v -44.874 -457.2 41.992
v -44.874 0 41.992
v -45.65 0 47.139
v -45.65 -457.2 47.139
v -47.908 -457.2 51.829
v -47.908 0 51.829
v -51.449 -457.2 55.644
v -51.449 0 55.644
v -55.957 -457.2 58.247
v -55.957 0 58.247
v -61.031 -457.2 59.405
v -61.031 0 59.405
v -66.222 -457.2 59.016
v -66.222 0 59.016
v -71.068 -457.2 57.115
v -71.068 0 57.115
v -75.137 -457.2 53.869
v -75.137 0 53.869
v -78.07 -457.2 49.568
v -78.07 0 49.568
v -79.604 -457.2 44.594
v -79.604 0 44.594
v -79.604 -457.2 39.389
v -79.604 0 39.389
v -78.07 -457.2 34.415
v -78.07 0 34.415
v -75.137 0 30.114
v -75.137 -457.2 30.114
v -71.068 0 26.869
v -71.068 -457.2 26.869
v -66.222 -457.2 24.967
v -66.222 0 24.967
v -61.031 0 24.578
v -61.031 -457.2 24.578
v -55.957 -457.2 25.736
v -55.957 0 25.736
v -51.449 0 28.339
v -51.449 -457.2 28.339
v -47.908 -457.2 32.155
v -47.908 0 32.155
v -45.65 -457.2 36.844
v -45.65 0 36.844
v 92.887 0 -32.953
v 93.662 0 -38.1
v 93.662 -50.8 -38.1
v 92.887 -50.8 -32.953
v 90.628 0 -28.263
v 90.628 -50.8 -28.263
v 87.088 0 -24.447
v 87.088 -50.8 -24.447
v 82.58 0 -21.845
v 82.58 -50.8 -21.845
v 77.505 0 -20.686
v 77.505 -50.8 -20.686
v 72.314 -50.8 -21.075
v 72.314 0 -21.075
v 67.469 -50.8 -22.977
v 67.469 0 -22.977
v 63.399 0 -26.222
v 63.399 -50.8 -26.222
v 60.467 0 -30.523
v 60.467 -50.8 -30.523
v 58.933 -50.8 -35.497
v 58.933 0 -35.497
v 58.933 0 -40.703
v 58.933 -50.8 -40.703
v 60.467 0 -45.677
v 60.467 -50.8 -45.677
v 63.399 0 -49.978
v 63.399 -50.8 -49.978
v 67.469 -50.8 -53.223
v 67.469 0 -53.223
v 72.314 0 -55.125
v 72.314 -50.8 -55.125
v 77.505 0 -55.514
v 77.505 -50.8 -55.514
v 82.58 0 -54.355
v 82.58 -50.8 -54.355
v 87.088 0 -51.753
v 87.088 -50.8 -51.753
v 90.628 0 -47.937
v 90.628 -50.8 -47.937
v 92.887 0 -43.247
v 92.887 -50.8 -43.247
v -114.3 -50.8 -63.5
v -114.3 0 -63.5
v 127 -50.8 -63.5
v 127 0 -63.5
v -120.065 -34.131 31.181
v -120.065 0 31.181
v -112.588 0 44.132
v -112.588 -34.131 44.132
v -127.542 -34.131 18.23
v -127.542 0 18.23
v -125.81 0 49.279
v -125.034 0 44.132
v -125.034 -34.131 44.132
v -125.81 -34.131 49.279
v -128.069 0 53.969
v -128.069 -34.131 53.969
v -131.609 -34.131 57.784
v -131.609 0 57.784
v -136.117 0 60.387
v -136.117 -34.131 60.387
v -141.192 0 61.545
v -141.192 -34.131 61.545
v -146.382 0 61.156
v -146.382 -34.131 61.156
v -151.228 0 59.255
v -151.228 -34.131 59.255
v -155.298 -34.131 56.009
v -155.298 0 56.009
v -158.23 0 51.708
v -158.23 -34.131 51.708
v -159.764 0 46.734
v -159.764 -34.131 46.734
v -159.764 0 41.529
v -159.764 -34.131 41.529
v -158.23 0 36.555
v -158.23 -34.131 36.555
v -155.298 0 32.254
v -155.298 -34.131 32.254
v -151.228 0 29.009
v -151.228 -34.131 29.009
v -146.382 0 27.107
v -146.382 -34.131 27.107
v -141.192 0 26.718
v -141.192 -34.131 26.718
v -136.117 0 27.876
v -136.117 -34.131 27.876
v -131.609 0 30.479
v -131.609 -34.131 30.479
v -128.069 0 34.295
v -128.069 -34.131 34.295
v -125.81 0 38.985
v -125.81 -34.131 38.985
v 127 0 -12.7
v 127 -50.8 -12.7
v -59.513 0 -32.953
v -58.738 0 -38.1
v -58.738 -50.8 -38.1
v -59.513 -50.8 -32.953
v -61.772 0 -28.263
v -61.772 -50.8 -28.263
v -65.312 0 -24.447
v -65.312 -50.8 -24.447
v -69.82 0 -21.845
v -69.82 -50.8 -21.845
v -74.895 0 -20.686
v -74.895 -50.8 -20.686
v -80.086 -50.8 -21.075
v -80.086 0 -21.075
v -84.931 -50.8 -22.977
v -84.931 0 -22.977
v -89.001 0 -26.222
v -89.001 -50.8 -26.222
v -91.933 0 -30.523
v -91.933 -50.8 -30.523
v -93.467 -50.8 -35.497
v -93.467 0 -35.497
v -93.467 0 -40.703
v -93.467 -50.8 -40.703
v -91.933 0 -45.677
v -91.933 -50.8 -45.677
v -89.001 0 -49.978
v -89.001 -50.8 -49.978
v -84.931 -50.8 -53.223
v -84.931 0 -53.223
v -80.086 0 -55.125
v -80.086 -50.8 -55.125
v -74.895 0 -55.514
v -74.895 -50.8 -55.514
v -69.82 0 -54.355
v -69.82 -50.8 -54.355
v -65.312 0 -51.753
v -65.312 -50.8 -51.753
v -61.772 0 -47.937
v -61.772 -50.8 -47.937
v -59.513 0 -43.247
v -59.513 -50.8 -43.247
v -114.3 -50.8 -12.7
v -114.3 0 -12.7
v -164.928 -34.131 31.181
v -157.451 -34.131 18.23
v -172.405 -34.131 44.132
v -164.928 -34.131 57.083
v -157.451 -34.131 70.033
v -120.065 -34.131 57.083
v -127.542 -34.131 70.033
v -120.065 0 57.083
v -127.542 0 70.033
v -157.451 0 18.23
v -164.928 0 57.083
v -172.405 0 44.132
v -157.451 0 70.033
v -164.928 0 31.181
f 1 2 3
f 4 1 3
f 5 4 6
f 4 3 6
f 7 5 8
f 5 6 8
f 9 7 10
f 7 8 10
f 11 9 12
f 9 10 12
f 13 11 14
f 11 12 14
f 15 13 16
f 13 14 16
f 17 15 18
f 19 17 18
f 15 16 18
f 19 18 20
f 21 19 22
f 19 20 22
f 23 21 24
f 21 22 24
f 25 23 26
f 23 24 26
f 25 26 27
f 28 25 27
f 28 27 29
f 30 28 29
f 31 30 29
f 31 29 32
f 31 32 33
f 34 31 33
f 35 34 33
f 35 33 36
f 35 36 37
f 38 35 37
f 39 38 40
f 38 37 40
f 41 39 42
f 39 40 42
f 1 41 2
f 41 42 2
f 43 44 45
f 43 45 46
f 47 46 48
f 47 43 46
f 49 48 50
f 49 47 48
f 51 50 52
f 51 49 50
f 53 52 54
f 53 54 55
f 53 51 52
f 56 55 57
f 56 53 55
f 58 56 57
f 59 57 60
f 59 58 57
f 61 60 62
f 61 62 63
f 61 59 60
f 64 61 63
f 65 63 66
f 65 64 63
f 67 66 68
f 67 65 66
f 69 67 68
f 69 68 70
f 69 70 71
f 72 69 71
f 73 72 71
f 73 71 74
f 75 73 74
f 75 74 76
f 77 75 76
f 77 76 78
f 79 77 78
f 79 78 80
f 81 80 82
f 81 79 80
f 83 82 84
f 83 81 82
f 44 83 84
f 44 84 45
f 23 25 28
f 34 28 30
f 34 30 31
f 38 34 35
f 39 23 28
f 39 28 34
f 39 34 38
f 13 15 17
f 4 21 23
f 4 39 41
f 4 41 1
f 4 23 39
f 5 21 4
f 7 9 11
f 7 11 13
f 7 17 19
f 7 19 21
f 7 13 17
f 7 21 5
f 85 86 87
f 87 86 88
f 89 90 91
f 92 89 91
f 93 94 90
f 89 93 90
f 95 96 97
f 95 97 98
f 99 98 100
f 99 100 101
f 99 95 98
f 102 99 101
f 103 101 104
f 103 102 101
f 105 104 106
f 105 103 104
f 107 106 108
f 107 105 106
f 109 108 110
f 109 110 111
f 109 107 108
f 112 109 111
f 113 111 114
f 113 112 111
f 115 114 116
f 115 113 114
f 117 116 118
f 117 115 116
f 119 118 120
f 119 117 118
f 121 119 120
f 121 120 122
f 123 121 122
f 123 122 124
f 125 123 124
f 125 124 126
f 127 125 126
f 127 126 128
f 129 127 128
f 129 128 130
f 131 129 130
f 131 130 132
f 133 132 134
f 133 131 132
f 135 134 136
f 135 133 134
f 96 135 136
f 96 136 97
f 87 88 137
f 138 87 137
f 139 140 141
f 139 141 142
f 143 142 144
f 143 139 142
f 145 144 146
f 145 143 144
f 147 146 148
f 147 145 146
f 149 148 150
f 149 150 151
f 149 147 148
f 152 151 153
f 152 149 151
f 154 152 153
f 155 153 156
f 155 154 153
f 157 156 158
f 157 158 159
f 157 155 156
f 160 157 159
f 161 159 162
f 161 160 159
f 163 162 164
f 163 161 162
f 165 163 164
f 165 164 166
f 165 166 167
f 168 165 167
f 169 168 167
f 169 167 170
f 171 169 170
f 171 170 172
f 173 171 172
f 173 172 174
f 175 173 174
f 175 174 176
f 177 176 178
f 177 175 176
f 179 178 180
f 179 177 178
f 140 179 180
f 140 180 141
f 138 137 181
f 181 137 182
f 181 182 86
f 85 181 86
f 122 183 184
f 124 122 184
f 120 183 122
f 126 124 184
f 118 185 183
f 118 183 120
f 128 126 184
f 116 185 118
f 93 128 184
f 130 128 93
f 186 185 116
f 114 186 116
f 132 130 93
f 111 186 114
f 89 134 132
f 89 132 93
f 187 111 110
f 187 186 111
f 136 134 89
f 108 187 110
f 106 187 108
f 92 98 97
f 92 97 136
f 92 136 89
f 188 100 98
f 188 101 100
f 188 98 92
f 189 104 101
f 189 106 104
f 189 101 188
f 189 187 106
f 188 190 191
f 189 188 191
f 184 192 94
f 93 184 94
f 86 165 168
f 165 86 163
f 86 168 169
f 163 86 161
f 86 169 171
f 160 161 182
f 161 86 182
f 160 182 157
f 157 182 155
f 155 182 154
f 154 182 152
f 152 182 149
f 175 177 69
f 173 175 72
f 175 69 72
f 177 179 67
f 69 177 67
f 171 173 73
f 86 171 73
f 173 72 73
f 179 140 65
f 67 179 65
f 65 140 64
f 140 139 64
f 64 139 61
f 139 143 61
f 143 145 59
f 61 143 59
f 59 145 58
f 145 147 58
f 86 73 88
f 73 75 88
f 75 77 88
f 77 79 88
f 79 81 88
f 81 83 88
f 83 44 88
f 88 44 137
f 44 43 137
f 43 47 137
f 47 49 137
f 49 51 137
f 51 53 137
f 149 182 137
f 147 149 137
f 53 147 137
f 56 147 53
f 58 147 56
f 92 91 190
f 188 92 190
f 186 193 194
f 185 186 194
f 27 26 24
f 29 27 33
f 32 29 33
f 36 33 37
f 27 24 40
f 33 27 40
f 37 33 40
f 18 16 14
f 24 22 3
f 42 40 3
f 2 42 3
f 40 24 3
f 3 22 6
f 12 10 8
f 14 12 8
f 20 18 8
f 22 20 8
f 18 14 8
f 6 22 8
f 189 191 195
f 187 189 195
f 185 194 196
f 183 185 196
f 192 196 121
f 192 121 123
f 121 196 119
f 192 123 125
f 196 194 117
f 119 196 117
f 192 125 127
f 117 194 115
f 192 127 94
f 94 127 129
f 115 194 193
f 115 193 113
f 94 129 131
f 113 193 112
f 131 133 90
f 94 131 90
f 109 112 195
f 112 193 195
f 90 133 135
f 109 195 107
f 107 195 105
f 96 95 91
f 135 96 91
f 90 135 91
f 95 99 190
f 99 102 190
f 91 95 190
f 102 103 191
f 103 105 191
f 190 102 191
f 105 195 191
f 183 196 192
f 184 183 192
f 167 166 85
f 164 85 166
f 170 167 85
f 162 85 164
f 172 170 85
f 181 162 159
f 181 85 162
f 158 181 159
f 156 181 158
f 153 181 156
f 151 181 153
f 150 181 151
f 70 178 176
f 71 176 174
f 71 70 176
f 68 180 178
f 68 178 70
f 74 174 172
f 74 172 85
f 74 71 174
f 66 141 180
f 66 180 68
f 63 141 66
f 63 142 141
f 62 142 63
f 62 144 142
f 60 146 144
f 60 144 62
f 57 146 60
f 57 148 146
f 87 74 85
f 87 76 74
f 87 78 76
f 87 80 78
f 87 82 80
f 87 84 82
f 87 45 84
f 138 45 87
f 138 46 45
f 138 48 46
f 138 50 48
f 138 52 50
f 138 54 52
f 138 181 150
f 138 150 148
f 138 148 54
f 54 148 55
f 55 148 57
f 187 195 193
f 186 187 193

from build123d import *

# Parameters (mm, degrees)
F0_R     = 17.4625
F1_DEPTH = 50.8
F2_R     = 17.4625
F3_DEPTH = 34.13125
F4_R     = 17.4625
F5_DEPTH = 457.2


with BuildPart() as f1:
    # F0 (on Front) → F1 (new body)
    with BuildSketch(Plane.XZ):
        Polygon((127, -12.7), (-114.3, -12.7), (-114.3, -63.5), (12.7, -63.5), (127, -63.5), align=None)
        with Locations((-76.2, -38.1)):
            Circle(F0_R, mode=Mode.SUBTRACT)
        with Locations((76.2, -38.1)):
            Circle(F0_R, mode=Mode.SUBTRACT)
    extrude(amount=F1_DEPTH)


with BuildPart() as f3:
    # F2 (on Front) → F3 (new body)
    with BuildSketch(Plane.XZ):
        with BuildLine():
            Line((-127.5423804553, 18.2300350483), (-120.065218545, 31.1808593733))
            ThreePointArc((-120.065218545, 31.1808593733), (-129.5458803928, 21.7001979535), (-142.4967050552, 18.2300350483))
            Line((-142.4967050552, 18.2300350483), (-127.5423804553, 18.2300350483))
        make_face()
        with BuildLine():
            ThreePointArc((-120.0652182506, 57.0825102133), (-117.4776324014, 50.8355254599), (-116.5950550552, 44.1316850483))
            ThreePointArc((-116.5950550552, 44.1316850483), (-117.4776324776, 37.4278443523), (-120.065218545, 31.1808593733))
            Line((-120.065218545, 31.1808593733), (-112.5880558553, 44.1316850483))
            Line((-112.5880558553, 44.1316850483), (-120.0652182506, 57.0825102133))
        make_face()
        with BuildLine():
            ThreePointArc((-142.4967050552, 70.0333350483), (-129.5458801377, 66.5631719959), (-120.0652182506, 57.0825102133))
            Line((-120.0652182506, 57.0825102133), (-127.5423804553, 70.0333350483))
            Line((-127.5423804553, 70.0333350483), (-142.4967050552, 70.0333350483))
        make_face()
        with BuildLine():
            ThreePointArc((-164.9281916513, 57.0825105746), (-155.4475297921, 66.5631721002), (-142.4967050552, 70.0333350483))
            Line((-142.4967050552, 70.0333350483), (-157.4510296552, 70.0333350483))
            Line((-157.4510296552, 70.0333350483), (-164.9281916513, 57.0825105746))
        make_face()
        with BuildLine():
            ThreePointArc((-164.9281923793, 31.180860783), (-168.3983550552, 44.1316857764), (-164.9281916513, 57.0825105746))
            Line((-164.9281916513, 57.0825105746), (-172.4053542551, 44.1316850483))
            Line((-172.4053542551, 44.1316850483), (-164.9281923793, 31.180860783))
        make_face()
        with BuildLine():
            Line((-157.4510296552, 18.2300350483), (-142.4967050552, 18.2300350483))
            ThreePointArc((-142.4967050552, 18.2300350483), (-155.4475304226, 21.7001983605), (-164.9281923793, 31.180860783))
            Line((-164.9281923793, 31.180860783), (-157.4510296552, 18.2300350483))
        make_face()
        with BuildLine():
            ThreePointArc((-120.065218545, 31.1808593733), (-117.4776324776, 37.4278443523), (-116.5950550552, 44.1316850483))
            ThreePointArc((-116.5950550552, 44.1316850483), (-117.4776324014, 50.8355254599), (-120.0652182506, 57.0825102133))
            ThreePointArc((-120.0652182506, 57.0825102133), (-129.5458801377, 66.5631719959), (-142.4967050552, 70.0333350483))
            ThreePointArc((-142.4967050552, 70.0333350483), (-155.4475297921, 66.5631721002), (-164.9281916513, 57.0825105746))
            ThreePointArc((-164.9281916513, 57.0825105746), (-168.3983550552, 44.1316857764), (-164.9281923793, 31.180860783))
            ThreePointArc((-164.9281923793, 31.180860783), (-155.4475304226, 21.7001983605), (-142.4967050552, 18.2300350483))
            ThreePointArc((-142.4967050552, 18.2300350483), (-129.5458803928, 21.7001979535), (-120.065218545, 31.1808593733))
        make_face()
        with Locations((-142.4967050552, 44.1316850483)):
            Circle(F2_R, mode=Mode.SUBTRACT)
    extrude(amount=F3_DEPTH)


with BuildPart() as f5:
    # F4 (on Front) → F5 (new body)
    with BuildSketch(Plane.XZ):
        with Locations((-62.3364560306, 41.9916026294)):
            Circle(F4_R)
    extrude(amount=F5_DEPTH)


solid = Compound([f1.part, f3.part, f5.part])
